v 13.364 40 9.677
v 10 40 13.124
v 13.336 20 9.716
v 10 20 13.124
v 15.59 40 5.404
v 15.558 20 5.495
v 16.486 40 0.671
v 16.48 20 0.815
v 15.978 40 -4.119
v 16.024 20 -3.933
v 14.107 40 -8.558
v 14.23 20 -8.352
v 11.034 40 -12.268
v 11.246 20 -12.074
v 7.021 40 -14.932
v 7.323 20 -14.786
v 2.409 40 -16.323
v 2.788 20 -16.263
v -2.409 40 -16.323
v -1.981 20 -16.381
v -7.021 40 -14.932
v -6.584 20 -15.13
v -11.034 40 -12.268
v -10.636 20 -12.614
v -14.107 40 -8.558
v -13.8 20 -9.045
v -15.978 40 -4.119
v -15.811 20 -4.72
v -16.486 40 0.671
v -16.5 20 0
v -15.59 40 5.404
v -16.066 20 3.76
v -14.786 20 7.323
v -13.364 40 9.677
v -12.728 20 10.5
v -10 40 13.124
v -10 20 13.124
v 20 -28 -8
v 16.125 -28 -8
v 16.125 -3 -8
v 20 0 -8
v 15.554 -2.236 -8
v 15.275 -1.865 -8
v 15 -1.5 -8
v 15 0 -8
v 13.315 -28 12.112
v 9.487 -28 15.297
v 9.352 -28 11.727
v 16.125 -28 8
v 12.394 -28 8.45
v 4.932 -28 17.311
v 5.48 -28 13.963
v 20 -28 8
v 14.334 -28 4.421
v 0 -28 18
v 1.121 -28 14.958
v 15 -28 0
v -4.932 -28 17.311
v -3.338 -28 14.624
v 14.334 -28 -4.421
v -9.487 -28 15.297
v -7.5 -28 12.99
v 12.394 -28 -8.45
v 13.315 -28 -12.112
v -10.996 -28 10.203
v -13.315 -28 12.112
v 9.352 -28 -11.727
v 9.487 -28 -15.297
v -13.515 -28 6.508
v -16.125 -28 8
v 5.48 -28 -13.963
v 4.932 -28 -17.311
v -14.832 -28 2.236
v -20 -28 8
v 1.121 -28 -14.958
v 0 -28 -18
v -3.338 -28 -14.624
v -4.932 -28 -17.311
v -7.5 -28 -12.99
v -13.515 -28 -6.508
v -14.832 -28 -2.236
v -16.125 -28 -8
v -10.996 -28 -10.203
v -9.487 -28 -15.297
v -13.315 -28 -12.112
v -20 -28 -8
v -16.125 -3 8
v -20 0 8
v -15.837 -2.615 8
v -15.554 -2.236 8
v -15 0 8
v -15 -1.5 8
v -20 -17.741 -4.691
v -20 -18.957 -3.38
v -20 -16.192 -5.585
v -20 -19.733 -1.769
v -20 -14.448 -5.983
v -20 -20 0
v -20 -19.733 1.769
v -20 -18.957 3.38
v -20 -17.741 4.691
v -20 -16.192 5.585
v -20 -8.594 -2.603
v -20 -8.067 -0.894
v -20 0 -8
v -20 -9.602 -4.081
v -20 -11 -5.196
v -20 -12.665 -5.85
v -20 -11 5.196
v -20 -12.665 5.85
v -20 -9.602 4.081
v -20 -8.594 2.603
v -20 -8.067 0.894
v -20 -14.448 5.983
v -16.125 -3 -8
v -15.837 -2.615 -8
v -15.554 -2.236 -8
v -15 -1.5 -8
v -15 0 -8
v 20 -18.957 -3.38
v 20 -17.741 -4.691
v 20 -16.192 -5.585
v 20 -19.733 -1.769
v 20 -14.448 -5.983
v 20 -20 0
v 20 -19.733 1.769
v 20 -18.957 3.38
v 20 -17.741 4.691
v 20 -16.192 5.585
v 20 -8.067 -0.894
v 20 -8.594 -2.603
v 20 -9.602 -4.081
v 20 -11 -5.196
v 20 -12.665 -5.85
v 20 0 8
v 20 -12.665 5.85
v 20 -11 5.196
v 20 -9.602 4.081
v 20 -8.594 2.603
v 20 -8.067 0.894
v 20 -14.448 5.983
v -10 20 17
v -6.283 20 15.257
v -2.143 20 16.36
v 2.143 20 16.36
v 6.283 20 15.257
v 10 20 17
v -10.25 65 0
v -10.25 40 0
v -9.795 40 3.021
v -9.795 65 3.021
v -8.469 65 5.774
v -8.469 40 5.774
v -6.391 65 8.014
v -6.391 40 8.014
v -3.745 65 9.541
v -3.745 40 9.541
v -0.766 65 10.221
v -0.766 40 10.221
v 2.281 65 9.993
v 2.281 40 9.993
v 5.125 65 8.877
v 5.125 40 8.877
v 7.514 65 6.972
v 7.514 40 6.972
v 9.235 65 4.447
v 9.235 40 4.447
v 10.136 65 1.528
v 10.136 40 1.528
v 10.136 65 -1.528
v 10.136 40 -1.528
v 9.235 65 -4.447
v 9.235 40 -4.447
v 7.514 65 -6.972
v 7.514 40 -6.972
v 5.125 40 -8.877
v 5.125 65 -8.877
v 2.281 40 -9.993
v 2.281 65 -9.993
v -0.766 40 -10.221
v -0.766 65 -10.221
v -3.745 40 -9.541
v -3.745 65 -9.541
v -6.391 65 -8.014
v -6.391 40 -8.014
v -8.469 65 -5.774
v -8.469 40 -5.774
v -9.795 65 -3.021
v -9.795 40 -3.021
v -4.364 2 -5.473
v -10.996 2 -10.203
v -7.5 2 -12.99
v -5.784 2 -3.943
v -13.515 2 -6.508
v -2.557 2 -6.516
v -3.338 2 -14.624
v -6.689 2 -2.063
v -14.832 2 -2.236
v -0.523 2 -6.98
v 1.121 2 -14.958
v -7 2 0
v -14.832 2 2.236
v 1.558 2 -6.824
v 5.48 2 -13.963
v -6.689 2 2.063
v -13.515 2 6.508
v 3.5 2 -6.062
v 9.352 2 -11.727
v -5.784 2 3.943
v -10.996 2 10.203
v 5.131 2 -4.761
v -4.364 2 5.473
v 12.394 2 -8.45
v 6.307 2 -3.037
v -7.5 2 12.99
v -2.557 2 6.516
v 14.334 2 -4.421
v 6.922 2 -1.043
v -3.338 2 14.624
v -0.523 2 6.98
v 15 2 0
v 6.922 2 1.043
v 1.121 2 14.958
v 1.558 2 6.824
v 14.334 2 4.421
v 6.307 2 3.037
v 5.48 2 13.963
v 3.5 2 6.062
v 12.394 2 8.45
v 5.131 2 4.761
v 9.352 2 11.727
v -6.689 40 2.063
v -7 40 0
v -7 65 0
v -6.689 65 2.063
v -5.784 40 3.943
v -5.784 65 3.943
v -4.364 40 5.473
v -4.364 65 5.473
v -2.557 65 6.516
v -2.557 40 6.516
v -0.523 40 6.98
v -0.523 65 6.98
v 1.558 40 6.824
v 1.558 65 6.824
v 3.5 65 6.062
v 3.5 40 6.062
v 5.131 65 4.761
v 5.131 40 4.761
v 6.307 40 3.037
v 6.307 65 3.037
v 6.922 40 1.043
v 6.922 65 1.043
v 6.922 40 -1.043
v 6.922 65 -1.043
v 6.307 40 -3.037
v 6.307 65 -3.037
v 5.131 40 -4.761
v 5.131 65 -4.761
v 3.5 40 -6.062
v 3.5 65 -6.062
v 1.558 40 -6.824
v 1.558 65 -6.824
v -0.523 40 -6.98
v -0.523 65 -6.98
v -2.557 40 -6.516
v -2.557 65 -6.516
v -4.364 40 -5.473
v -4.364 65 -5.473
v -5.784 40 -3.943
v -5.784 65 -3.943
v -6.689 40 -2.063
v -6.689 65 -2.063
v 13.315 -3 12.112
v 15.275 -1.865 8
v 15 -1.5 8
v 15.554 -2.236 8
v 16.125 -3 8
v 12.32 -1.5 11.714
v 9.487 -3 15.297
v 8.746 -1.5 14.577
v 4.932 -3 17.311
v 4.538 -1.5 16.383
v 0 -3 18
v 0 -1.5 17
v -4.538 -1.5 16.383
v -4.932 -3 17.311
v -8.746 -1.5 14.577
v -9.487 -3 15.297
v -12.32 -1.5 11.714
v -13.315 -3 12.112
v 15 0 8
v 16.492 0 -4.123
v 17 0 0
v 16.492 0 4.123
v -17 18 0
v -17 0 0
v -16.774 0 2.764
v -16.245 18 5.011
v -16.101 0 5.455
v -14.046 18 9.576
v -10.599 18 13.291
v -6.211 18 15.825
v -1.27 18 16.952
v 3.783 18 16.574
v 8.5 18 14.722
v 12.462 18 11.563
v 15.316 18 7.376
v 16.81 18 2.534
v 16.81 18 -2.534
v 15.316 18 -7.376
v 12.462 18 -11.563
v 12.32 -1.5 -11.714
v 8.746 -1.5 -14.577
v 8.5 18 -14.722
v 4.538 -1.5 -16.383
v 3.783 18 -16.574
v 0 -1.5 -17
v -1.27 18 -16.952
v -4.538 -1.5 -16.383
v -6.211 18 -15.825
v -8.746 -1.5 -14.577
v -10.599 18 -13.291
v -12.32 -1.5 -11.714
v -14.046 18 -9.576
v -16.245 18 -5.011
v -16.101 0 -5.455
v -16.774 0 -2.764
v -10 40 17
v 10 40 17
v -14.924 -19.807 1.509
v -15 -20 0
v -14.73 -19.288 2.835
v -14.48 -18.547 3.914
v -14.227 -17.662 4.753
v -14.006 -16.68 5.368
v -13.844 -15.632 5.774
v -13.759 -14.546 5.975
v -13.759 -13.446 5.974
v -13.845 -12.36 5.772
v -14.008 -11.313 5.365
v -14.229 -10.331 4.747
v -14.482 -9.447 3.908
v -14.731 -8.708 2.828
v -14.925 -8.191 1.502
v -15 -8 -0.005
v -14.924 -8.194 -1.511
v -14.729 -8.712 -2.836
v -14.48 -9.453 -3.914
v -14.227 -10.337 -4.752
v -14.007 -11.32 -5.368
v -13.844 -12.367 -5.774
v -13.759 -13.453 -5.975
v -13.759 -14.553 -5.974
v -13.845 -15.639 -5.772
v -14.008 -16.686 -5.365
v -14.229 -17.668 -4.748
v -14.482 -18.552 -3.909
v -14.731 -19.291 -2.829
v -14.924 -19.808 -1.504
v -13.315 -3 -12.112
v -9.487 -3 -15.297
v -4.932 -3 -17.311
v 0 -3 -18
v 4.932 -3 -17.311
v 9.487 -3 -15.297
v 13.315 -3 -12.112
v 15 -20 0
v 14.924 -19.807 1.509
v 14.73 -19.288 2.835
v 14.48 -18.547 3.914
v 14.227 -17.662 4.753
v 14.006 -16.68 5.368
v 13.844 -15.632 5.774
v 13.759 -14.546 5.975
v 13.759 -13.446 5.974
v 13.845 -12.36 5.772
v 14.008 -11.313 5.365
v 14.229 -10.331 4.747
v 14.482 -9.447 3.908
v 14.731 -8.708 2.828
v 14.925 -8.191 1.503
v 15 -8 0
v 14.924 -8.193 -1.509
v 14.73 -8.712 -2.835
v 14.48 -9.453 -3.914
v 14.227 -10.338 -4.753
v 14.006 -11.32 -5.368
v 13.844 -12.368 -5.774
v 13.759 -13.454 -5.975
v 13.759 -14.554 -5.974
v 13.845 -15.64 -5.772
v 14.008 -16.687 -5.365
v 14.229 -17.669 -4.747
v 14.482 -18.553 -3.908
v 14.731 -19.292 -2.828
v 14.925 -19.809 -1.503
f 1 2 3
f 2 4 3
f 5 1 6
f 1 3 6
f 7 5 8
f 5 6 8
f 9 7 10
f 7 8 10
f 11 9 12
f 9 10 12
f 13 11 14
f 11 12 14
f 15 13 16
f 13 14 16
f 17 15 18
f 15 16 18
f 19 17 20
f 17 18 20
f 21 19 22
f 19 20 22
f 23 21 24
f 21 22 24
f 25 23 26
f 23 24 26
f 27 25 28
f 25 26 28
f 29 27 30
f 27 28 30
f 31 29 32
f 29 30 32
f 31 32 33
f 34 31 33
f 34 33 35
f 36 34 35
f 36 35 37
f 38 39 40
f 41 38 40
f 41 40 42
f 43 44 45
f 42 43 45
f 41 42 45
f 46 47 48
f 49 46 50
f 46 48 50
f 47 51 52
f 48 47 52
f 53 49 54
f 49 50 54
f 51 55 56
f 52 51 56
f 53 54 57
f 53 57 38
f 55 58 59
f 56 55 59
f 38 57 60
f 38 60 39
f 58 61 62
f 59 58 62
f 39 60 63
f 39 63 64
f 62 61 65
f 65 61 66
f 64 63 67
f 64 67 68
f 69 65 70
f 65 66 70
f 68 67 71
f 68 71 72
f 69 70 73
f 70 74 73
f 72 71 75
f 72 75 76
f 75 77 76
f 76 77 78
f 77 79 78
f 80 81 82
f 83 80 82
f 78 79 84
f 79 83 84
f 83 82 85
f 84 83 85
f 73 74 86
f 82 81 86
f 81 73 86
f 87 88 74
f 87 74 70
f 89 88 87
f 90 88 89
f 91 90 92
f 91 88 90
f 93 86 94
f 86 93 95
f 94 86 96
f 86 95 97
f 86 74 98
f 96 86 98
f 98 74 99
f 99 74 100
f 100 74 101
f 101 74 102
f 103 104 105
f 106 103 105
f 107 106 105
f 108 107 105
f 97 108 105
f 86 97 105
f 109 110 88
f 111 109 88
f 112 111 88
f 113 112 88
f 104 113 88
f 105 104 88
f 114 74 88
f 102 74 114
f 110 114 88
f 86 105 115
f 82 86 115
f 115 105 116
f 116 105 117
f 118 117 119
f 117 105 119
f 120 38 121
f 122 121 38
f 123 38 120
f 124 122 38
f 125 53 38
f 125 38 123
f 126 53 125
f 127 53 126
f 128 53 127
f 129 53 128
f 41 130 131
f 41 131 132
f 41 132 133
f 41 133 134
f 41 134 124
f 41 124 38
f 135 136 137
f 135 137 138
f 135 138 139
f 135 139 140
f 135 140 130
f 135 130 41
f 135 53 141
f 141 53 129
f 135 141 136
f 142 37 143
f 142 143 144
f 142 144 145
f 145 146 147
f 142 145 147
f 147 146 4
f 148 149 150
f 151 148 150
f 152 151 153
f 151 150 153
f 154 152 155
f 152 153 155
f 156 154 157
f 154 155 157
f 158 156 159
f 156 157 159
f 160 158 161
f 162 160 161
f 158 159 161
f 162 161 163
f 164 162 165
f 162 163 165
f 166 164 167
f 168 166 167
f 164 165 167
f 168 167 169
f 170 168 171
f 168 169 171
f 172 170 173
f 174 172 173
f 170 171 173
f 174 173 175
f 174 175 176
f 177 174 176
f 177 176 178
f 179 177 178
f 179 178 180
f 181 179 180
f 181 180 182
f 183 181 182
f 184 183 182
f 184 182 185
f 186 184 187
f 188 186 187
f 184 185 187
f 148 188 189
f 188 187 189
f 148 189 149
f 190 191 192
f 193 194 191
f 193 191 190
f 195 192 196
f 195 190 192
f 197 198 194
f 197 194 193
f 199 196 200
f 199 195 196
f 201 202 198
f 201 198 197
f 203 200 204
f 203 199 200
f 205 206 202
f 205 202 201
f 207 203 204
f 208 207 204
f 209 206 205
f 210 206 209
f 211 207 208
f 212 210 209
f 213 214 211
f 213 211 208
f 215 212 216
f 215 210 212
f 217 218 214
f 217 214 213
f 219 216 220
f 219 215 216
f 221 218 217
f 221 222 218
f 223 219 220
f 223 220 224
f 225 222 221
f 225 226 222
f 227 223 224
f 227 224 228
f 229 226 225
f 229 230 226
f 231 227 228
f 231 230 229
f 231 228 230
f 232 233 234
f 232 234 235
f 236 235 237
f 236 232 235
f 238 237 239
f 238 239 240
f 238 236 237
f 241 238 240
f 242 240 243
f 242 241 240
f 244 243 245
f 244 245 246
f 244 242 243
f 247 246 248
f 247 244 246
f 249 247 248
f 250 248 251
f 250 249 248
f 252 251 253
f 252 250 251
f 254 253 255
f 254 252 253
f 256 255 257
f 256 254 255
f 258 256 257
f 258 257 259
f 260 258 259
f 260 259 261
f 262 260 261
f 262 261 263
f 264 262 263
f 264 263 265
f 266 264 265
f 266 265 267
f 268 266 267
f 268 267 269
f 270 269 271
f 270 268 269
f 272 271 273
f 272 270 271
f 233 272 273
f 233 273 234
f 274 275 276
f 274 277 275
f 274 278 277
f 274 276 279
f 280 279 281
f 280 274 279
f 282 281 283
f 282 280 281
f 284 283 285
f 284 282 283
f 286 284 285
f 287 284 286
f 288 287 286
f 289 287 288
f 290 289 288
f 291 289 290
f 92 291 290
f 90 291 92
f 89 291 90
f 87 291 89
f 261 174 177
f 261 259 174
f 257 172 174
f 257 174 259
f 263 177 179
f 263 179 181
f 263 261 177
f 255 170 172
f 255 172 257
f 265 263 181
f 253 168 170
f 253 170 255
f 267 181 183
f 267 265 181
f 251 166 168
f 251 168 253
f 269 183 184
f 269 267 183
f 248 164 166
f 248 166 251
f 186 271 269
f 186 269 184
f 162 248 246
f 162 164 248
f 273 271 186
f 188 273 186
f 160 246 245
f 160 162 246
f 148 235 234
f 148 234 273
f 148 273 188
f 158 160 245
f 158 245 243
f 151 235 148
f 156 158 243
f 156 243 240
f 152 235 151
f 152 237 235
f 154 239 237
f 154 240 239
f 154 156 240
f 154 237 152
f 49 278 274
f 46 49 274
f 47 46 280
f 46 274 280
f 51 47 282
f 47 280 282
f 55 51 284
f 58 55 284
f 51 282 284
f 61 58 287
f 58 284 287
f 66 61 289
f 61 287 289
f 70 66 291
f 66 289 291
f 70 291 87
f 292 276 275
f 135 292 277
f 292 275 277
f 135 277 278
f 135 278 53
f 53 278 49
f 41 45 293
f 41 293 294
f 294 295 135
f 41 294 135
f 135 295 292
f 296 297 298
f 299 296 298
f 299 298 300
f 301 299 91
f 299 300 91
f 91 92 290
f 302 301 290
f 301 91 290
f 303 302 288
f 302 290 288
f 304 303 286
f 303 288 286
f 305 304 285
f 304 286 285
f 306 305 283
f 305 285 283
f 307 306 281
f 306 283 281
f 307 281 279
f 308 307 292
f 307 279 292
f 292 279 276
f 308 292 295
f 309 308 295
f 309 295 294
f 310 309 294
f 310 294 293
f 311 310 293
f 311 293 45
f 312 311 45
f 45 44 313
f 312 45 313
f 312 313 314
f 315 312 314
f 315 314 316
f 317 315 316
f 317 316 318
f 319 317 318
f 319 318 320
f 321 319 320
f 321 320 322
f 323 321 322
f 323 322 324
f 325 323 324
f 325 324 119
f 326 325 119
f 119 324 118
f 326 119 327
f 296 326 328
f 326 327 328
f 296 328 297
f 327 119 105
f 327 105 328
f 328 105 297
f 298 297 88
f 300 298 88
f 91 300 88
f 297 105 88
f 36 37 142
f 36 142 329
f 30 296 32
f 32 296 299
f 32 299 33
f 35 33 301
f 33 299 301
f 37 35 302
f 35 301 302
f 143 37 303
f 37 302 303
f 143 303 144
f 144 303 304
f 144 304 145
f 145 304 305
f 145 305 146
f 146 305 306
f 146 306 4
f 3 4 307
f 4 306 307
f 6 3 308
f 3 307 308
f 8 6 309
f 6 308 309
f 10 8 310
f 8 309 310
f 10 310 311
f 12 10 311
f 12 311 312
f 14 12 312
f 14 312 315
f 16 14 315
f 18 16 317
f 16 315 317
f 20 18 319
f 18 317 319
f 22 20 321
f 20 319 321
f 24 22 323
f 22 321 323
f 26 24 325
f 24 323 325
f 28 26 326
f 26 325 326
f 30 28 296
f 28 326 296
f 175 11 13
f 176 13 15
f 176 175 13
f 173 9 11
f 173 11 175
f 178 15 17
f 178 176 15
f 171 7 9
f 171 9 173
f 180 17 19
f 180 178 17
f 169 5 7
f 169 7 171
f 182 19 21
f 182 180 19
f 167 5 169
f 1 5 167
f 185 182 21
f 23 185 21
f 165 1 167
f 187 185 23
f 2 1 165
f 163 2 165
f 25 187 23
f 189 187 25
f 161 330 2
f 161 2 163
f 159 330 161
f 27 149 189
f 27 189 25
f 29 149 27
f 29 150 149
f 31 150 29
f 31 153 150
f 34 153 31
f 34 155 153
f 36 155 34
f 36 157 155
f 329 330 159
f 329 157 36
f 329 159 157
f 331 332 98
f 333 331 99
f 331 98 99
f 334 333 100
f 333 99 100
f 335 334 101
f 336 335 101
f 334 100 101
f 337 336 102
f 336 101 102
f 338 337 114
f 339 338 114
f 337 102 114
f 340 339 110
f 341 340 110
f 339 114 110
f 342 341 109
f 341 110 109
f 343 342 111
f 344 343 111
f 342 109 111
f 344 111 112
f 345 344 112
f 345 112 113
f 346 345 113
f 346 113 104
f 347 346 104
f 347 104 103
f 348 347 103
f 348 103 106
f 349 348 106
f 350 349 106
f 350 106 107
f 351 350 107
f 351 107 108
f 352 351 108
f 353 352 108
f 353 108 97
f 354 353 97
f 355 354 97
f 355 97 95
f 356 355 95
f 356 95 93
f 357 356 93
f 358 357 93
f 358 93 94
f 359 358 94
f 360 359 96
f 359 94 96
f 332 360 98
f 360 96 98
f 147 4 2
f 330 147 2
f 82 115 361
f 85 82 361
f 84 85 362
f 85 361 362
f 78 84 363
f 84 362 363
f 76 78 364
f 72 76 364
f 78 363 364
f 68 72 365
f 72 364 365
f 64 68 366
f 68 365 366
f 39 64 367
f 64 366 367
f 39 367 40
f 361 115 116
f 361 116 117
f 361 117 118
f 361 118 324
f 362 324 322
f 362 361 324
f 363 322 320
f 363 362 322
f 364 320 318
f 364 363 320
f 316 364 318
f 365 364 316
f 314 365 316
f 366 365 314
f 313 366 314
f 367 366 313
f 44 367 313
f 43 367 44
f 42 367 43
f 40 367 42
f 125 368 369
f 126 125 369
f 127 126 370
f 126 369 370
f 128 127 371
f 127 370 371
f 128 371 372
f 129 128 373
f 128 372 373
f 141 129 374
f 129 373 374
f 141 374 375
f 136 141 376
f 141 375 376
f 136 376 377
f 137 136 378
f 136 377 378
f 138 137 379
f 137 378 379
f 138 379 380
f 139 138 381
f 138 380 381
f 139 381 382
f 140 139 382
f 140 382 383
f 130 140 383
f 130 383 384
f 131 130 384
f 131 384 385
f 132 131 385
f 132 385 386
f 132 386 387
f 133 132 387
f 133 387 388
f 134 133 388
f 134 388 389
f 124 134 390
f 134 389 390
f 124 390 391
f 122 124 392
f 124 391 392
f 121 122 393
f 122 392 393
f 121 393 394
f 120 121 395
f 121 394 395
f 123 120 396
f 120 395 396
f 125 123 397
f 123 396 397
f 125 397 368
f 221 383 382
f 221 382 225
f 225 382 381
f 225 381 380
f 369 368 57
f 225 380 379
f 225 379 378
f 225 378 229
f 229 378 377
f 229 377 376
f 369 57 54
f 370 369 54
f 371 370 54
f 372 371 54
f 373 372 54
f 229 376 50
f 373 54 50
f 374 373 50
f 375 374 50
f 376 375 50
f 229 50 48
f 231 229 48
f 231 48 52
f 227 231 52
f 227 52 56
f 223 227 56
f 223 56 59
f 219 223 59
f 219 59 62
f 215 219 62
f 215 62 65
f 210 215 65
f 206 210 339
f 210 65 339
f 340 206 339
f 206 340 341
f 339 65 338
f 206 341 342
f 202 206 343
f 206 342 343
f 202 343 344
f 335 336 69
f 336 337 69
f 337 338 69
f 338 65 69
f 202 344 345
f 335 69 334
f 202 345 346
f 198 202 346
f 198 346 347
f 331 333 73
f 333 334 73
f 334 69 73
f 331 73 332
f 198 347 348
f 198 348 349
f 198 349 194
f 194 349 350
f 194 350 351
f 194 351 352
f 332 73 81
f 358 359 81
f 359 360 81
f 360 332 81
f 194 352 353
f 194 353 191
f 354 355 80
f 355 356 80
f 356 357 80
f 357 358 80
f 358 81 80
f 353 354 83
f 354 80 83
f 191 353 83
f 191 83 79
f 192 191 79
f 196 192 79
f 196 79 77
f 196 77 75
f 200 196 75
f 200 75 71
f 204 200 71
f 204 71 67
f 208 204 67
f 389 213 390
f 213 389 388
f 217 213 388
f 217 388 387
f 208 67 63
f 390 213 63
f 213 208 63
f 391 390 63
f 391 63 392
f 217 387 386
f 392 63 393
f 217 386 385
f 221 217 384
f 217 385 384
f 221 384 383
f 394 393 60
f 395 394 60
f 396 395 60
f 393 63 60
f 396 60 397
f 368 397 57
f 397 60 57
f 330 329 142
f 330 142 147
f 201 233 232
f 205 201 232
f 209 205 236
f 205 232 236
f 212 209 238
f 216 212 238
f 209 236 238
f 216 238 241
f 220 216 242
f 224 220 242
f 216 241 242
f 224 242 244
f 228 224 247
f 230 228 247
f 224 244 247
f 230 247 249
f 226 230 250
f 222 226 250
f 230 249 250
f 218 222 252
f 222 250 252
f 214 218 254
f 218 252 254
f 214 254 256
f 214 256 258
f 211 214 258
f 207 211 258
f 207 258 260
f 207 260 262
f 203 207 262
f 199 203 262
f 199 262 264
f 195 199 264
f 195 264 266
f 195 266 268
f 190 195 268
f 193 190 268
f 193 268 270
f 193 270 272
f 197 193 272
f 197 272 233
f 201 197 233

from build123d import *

# Parameters (mm, degrees)
F0_R          = 18
F0_R_2        = 15
F1_DEPTH      = 28
F3_DEPTH      = 20
F4_DEPTH      = 20
F5_R          = 9
F6_DEPTH      = 25
F7_R          = 17
F7_R_2        = 6.5
F8_DEPTH      = 20
F9_SIZE2      = 2
F9_SIZE       = 0.5
F10_DEPTH     = 20
F11_W         = 10
F11_H         = 20
F12_DEPTH     = 17
F13_R         = 15
F14_DEPTH     = 30
F15_R         = 7
F16_DEPTH     = 200
F17_T4_ANGLE  = 187.4641783336
F17_S5_R      = 17
F17_T6_DEPTH  = 27
F17_T11_ANGLE = 187.4641783336
F17_S12_R     = 17
F17_T13_DEPTH = 27
F18_R         = 10.25
F18_R_2       = 7
F19_DEPTH     = 25
F20_R         = 6
F21_DEPTH     = 45


# Not quite as in the source:
# - a fillet or chamfer that OpenCascade refuses, or shapes differently, is made with other operations: its cross-section is extruded or revolved along the edge and cut away or added


with BuildPart() as f1:
    # F0 (on Front) → F1 (new body)
    with BuildSketch(Plane.XZ):
        Circle(F0_R)
        Circle(F0_R_2, mode=Mode.SUBTRACT)
    extrude(amount=F1_DEPTH)

    # F2 (on Right) → F3 (join)
    with BuildSketch(Plane.YZ):
        Polygon((0, -8), (0, 0), (0, 8), (-28, 8), (-28, -8), align=None)
    extrude(amount=-F3_DEPTH)

    # F4 (add): a face of the model
    f4_faces = [f1.faces().sort_by_distance(p)[0] for p in [
        (0, -14, 0),
    ]]
    extrude(f4_faces, amount=F4_DEPTH)

    # F5 (on face) → F6 (cut)
    with BuildSketch(Plane.XZ.offset(28)):
        Circle(F5_R)
    extrude(amount=-F6_DEPTH, mode=Mode.SUBTRACT)

    # F7 (on face) → F8 (join)
    with BuildSketch(Plane(origin=(0, 0, 0), x_dir=(-1, 0, 0), z_dir=(0, 1, 0))):
        Circle(F7_R)
        Circle(F7_R_2, mode=Mode.SUBTRACT)
    extrude(amount=F8_DEPTH)

    # F9
    f9_edges = [f1.edges().sort_by_distance(p)[0] for p in [
        (17, 20, 0),
    ]]
    f9_side = f1.faces().sort_by_distance((16.519167, 20, 0))[0]
    chamfer(f9_edges, length=F9_SIZE, length2=F9_SIZE2, reference=f9_side)

    # F10 (add): a face of the model
    f10_faces = [f1.faces().sort_by_distance(p)[0] for p in [
        (16.0333095244, 20, 0),
    ]]
    extrude(f10_faces, amount=F10_DEPTH)

    # F11 (on Top) → F12 (join)
    with BuildSketch(Plane.XY):
        with Locations((-5, 30)):
            Rectangle(F11_W, F11_H)
        with Locations((5, 30)):
            Rectangle(F11_W, F11_H)
    extrude(amount=F12_DEPTH)

    # F13 (on face) → F14 (cut)
    with BuildSketch(Plane.XZ.offset(28)):
        Circle(F13_R)
    extrude(amount=-F14_DEPTH, mode=Mode.SUBTRACT)

    # F15 (on face) → F16 (cut)
    with BuildSketch(Plane(origin=(0, 40, 0), x_dir=(-1, 0, 0), z_dir=(0, 1, 0))):
        Circle(F15_R)
        with BuildLine():
            Line((-6.5, 0), (6.5, 0))
            ThreePointArc((6.5, 0), (0, -6.5), (-6.5, 0))
        make_face(mode=Mode.SUBTRACT)
    extrude(amount=-F16_DEPTH, mode=Mode.SUBTRACT)

    # F17: chamfer of 3 x 2 on 2 edges, made by hand


with BuildPart() as f17_tool2:
    # F17_s3 → F17_t4 (revolve)
    with BuildSketch(Plane(origin=(0, 0, 0), x_dir=(0, 1, 0), z_dir=(0.0650911923, 0, 0.9978793197))):
        with BuildLine():
            Line((0.7488452649, 15.5007698234), (-3.7488452649, 18.4992301766))
            Line((-3.7488452649, 18.4992301766), (-3.7488452649, 18.9492301766))
            ThreePointArc((-3.7488452649, 18.9492301766), (-1.8744226325, 18.45), (0, 18.45))
            Line((0, 18.45), (0.45, 18))
            ThreePointArc((0.45, 18), (0.45, 16.7503849117), (1.1988452649, 15.5007698234))
            Line((1.1988452649, 15.5007698234), (0.7488452649, 15.5007698234))
        make_face()
    revolve(axis=Axis((0, 0, 0), (0, -1, 0)), revolution_arc=F17_T4_ANGLE)

    # F17_s5 → F17_t6 (cut, symmetric)
    with BuildSketch(Plane.XZ.offset(0.9)):
        Circle(F17_S5_R)
    extrude(amount=F17_T6_DEPTH, both=True, mode=Mode.SUBTRACT)

    split(bisect_by=Plane.XY.offset(-8), keep=Keep.BOTTOM)


with BuildPart() as f1_1:
    add(f1.part)

    # F17_t1: cut F17_tool2
    add(f17_tool2.part, mode=Mode.SUBTRACT)


with BuildPart() as f17_tool9:
    # F17_s10 → F17_t11 (revolve)
    with BuildSketch(Plane(origin=(0, 0, 0), x_dir=(0, 1, 0), z_dir=(-0.0650911923, 0, -0.9978793197))):
        with BuildLine():
            Line((0.7488452649, 15.5007698234), (-3.7488452649, 18.4992301766))
            Line((-3.7488452649, 18.4992301766), (-3.7488452649, 18.9492301766))
            ThreePointArc((-3.7488452649, 18.9492301766), (-1.8744226325, 18.45), (0, 18.45))
            Line((0, 18.45), (0.45, 18))
            ThreePointArc((0.45, 18), (0.45, 16.7503849117), (1.1988452649, 15.5007698234))
            Line((1.1988452649, 15.5007698234), (0.7488452649, 15.5007698234))
        make_face()
    revolve(axis=Axis((0, 0, 0), (0, -1, 0)), revolution_arc=F17_T11_ANGLE)

    # F17_s12 → F17_t13 (cut, symmetric)
    with BuildSketch(Plane.XZ.offset(0.9)):
        Circle(F17_S12_R)
    extrude(amount=F17_T13_DEPTH, both=True, mode=Mode.SUBTRACT)

    split(bisect_by=Plane.XY.offset(8), keep=Keep.TOP)


with BuildPart() as f1_2:
    add(f1_1.part)

    # F17_t8: cut F17_tool9
    add(f17_tool9.part, mode=Mode.SUBTRACT)

    # F18 (on face) → F19 (join)
    with BuildSketch(Plane(origin=(0, 40, 0), x_dir=(-1, 0, 0), z_dir=(0, 1, 0))):
        Circle(F18_R)
        Circle(F18_R_2, mode=Mode.SUBTRACT)
    extrude(amount=F19_DEPTH)

    # F20 (on face) → F21 (cut)
    with BuildSketch(Plane(origin=(-20, 0, 0), x_dir=(0, -1, 0), z_dir=(-1, 0, 0))):
        with Locations((14, 0)):
            Circle(F20_R)
    extrude(amount=-F21_DEPTH, mode=Mode.SUBTRACT)


solid = f1_2.part
